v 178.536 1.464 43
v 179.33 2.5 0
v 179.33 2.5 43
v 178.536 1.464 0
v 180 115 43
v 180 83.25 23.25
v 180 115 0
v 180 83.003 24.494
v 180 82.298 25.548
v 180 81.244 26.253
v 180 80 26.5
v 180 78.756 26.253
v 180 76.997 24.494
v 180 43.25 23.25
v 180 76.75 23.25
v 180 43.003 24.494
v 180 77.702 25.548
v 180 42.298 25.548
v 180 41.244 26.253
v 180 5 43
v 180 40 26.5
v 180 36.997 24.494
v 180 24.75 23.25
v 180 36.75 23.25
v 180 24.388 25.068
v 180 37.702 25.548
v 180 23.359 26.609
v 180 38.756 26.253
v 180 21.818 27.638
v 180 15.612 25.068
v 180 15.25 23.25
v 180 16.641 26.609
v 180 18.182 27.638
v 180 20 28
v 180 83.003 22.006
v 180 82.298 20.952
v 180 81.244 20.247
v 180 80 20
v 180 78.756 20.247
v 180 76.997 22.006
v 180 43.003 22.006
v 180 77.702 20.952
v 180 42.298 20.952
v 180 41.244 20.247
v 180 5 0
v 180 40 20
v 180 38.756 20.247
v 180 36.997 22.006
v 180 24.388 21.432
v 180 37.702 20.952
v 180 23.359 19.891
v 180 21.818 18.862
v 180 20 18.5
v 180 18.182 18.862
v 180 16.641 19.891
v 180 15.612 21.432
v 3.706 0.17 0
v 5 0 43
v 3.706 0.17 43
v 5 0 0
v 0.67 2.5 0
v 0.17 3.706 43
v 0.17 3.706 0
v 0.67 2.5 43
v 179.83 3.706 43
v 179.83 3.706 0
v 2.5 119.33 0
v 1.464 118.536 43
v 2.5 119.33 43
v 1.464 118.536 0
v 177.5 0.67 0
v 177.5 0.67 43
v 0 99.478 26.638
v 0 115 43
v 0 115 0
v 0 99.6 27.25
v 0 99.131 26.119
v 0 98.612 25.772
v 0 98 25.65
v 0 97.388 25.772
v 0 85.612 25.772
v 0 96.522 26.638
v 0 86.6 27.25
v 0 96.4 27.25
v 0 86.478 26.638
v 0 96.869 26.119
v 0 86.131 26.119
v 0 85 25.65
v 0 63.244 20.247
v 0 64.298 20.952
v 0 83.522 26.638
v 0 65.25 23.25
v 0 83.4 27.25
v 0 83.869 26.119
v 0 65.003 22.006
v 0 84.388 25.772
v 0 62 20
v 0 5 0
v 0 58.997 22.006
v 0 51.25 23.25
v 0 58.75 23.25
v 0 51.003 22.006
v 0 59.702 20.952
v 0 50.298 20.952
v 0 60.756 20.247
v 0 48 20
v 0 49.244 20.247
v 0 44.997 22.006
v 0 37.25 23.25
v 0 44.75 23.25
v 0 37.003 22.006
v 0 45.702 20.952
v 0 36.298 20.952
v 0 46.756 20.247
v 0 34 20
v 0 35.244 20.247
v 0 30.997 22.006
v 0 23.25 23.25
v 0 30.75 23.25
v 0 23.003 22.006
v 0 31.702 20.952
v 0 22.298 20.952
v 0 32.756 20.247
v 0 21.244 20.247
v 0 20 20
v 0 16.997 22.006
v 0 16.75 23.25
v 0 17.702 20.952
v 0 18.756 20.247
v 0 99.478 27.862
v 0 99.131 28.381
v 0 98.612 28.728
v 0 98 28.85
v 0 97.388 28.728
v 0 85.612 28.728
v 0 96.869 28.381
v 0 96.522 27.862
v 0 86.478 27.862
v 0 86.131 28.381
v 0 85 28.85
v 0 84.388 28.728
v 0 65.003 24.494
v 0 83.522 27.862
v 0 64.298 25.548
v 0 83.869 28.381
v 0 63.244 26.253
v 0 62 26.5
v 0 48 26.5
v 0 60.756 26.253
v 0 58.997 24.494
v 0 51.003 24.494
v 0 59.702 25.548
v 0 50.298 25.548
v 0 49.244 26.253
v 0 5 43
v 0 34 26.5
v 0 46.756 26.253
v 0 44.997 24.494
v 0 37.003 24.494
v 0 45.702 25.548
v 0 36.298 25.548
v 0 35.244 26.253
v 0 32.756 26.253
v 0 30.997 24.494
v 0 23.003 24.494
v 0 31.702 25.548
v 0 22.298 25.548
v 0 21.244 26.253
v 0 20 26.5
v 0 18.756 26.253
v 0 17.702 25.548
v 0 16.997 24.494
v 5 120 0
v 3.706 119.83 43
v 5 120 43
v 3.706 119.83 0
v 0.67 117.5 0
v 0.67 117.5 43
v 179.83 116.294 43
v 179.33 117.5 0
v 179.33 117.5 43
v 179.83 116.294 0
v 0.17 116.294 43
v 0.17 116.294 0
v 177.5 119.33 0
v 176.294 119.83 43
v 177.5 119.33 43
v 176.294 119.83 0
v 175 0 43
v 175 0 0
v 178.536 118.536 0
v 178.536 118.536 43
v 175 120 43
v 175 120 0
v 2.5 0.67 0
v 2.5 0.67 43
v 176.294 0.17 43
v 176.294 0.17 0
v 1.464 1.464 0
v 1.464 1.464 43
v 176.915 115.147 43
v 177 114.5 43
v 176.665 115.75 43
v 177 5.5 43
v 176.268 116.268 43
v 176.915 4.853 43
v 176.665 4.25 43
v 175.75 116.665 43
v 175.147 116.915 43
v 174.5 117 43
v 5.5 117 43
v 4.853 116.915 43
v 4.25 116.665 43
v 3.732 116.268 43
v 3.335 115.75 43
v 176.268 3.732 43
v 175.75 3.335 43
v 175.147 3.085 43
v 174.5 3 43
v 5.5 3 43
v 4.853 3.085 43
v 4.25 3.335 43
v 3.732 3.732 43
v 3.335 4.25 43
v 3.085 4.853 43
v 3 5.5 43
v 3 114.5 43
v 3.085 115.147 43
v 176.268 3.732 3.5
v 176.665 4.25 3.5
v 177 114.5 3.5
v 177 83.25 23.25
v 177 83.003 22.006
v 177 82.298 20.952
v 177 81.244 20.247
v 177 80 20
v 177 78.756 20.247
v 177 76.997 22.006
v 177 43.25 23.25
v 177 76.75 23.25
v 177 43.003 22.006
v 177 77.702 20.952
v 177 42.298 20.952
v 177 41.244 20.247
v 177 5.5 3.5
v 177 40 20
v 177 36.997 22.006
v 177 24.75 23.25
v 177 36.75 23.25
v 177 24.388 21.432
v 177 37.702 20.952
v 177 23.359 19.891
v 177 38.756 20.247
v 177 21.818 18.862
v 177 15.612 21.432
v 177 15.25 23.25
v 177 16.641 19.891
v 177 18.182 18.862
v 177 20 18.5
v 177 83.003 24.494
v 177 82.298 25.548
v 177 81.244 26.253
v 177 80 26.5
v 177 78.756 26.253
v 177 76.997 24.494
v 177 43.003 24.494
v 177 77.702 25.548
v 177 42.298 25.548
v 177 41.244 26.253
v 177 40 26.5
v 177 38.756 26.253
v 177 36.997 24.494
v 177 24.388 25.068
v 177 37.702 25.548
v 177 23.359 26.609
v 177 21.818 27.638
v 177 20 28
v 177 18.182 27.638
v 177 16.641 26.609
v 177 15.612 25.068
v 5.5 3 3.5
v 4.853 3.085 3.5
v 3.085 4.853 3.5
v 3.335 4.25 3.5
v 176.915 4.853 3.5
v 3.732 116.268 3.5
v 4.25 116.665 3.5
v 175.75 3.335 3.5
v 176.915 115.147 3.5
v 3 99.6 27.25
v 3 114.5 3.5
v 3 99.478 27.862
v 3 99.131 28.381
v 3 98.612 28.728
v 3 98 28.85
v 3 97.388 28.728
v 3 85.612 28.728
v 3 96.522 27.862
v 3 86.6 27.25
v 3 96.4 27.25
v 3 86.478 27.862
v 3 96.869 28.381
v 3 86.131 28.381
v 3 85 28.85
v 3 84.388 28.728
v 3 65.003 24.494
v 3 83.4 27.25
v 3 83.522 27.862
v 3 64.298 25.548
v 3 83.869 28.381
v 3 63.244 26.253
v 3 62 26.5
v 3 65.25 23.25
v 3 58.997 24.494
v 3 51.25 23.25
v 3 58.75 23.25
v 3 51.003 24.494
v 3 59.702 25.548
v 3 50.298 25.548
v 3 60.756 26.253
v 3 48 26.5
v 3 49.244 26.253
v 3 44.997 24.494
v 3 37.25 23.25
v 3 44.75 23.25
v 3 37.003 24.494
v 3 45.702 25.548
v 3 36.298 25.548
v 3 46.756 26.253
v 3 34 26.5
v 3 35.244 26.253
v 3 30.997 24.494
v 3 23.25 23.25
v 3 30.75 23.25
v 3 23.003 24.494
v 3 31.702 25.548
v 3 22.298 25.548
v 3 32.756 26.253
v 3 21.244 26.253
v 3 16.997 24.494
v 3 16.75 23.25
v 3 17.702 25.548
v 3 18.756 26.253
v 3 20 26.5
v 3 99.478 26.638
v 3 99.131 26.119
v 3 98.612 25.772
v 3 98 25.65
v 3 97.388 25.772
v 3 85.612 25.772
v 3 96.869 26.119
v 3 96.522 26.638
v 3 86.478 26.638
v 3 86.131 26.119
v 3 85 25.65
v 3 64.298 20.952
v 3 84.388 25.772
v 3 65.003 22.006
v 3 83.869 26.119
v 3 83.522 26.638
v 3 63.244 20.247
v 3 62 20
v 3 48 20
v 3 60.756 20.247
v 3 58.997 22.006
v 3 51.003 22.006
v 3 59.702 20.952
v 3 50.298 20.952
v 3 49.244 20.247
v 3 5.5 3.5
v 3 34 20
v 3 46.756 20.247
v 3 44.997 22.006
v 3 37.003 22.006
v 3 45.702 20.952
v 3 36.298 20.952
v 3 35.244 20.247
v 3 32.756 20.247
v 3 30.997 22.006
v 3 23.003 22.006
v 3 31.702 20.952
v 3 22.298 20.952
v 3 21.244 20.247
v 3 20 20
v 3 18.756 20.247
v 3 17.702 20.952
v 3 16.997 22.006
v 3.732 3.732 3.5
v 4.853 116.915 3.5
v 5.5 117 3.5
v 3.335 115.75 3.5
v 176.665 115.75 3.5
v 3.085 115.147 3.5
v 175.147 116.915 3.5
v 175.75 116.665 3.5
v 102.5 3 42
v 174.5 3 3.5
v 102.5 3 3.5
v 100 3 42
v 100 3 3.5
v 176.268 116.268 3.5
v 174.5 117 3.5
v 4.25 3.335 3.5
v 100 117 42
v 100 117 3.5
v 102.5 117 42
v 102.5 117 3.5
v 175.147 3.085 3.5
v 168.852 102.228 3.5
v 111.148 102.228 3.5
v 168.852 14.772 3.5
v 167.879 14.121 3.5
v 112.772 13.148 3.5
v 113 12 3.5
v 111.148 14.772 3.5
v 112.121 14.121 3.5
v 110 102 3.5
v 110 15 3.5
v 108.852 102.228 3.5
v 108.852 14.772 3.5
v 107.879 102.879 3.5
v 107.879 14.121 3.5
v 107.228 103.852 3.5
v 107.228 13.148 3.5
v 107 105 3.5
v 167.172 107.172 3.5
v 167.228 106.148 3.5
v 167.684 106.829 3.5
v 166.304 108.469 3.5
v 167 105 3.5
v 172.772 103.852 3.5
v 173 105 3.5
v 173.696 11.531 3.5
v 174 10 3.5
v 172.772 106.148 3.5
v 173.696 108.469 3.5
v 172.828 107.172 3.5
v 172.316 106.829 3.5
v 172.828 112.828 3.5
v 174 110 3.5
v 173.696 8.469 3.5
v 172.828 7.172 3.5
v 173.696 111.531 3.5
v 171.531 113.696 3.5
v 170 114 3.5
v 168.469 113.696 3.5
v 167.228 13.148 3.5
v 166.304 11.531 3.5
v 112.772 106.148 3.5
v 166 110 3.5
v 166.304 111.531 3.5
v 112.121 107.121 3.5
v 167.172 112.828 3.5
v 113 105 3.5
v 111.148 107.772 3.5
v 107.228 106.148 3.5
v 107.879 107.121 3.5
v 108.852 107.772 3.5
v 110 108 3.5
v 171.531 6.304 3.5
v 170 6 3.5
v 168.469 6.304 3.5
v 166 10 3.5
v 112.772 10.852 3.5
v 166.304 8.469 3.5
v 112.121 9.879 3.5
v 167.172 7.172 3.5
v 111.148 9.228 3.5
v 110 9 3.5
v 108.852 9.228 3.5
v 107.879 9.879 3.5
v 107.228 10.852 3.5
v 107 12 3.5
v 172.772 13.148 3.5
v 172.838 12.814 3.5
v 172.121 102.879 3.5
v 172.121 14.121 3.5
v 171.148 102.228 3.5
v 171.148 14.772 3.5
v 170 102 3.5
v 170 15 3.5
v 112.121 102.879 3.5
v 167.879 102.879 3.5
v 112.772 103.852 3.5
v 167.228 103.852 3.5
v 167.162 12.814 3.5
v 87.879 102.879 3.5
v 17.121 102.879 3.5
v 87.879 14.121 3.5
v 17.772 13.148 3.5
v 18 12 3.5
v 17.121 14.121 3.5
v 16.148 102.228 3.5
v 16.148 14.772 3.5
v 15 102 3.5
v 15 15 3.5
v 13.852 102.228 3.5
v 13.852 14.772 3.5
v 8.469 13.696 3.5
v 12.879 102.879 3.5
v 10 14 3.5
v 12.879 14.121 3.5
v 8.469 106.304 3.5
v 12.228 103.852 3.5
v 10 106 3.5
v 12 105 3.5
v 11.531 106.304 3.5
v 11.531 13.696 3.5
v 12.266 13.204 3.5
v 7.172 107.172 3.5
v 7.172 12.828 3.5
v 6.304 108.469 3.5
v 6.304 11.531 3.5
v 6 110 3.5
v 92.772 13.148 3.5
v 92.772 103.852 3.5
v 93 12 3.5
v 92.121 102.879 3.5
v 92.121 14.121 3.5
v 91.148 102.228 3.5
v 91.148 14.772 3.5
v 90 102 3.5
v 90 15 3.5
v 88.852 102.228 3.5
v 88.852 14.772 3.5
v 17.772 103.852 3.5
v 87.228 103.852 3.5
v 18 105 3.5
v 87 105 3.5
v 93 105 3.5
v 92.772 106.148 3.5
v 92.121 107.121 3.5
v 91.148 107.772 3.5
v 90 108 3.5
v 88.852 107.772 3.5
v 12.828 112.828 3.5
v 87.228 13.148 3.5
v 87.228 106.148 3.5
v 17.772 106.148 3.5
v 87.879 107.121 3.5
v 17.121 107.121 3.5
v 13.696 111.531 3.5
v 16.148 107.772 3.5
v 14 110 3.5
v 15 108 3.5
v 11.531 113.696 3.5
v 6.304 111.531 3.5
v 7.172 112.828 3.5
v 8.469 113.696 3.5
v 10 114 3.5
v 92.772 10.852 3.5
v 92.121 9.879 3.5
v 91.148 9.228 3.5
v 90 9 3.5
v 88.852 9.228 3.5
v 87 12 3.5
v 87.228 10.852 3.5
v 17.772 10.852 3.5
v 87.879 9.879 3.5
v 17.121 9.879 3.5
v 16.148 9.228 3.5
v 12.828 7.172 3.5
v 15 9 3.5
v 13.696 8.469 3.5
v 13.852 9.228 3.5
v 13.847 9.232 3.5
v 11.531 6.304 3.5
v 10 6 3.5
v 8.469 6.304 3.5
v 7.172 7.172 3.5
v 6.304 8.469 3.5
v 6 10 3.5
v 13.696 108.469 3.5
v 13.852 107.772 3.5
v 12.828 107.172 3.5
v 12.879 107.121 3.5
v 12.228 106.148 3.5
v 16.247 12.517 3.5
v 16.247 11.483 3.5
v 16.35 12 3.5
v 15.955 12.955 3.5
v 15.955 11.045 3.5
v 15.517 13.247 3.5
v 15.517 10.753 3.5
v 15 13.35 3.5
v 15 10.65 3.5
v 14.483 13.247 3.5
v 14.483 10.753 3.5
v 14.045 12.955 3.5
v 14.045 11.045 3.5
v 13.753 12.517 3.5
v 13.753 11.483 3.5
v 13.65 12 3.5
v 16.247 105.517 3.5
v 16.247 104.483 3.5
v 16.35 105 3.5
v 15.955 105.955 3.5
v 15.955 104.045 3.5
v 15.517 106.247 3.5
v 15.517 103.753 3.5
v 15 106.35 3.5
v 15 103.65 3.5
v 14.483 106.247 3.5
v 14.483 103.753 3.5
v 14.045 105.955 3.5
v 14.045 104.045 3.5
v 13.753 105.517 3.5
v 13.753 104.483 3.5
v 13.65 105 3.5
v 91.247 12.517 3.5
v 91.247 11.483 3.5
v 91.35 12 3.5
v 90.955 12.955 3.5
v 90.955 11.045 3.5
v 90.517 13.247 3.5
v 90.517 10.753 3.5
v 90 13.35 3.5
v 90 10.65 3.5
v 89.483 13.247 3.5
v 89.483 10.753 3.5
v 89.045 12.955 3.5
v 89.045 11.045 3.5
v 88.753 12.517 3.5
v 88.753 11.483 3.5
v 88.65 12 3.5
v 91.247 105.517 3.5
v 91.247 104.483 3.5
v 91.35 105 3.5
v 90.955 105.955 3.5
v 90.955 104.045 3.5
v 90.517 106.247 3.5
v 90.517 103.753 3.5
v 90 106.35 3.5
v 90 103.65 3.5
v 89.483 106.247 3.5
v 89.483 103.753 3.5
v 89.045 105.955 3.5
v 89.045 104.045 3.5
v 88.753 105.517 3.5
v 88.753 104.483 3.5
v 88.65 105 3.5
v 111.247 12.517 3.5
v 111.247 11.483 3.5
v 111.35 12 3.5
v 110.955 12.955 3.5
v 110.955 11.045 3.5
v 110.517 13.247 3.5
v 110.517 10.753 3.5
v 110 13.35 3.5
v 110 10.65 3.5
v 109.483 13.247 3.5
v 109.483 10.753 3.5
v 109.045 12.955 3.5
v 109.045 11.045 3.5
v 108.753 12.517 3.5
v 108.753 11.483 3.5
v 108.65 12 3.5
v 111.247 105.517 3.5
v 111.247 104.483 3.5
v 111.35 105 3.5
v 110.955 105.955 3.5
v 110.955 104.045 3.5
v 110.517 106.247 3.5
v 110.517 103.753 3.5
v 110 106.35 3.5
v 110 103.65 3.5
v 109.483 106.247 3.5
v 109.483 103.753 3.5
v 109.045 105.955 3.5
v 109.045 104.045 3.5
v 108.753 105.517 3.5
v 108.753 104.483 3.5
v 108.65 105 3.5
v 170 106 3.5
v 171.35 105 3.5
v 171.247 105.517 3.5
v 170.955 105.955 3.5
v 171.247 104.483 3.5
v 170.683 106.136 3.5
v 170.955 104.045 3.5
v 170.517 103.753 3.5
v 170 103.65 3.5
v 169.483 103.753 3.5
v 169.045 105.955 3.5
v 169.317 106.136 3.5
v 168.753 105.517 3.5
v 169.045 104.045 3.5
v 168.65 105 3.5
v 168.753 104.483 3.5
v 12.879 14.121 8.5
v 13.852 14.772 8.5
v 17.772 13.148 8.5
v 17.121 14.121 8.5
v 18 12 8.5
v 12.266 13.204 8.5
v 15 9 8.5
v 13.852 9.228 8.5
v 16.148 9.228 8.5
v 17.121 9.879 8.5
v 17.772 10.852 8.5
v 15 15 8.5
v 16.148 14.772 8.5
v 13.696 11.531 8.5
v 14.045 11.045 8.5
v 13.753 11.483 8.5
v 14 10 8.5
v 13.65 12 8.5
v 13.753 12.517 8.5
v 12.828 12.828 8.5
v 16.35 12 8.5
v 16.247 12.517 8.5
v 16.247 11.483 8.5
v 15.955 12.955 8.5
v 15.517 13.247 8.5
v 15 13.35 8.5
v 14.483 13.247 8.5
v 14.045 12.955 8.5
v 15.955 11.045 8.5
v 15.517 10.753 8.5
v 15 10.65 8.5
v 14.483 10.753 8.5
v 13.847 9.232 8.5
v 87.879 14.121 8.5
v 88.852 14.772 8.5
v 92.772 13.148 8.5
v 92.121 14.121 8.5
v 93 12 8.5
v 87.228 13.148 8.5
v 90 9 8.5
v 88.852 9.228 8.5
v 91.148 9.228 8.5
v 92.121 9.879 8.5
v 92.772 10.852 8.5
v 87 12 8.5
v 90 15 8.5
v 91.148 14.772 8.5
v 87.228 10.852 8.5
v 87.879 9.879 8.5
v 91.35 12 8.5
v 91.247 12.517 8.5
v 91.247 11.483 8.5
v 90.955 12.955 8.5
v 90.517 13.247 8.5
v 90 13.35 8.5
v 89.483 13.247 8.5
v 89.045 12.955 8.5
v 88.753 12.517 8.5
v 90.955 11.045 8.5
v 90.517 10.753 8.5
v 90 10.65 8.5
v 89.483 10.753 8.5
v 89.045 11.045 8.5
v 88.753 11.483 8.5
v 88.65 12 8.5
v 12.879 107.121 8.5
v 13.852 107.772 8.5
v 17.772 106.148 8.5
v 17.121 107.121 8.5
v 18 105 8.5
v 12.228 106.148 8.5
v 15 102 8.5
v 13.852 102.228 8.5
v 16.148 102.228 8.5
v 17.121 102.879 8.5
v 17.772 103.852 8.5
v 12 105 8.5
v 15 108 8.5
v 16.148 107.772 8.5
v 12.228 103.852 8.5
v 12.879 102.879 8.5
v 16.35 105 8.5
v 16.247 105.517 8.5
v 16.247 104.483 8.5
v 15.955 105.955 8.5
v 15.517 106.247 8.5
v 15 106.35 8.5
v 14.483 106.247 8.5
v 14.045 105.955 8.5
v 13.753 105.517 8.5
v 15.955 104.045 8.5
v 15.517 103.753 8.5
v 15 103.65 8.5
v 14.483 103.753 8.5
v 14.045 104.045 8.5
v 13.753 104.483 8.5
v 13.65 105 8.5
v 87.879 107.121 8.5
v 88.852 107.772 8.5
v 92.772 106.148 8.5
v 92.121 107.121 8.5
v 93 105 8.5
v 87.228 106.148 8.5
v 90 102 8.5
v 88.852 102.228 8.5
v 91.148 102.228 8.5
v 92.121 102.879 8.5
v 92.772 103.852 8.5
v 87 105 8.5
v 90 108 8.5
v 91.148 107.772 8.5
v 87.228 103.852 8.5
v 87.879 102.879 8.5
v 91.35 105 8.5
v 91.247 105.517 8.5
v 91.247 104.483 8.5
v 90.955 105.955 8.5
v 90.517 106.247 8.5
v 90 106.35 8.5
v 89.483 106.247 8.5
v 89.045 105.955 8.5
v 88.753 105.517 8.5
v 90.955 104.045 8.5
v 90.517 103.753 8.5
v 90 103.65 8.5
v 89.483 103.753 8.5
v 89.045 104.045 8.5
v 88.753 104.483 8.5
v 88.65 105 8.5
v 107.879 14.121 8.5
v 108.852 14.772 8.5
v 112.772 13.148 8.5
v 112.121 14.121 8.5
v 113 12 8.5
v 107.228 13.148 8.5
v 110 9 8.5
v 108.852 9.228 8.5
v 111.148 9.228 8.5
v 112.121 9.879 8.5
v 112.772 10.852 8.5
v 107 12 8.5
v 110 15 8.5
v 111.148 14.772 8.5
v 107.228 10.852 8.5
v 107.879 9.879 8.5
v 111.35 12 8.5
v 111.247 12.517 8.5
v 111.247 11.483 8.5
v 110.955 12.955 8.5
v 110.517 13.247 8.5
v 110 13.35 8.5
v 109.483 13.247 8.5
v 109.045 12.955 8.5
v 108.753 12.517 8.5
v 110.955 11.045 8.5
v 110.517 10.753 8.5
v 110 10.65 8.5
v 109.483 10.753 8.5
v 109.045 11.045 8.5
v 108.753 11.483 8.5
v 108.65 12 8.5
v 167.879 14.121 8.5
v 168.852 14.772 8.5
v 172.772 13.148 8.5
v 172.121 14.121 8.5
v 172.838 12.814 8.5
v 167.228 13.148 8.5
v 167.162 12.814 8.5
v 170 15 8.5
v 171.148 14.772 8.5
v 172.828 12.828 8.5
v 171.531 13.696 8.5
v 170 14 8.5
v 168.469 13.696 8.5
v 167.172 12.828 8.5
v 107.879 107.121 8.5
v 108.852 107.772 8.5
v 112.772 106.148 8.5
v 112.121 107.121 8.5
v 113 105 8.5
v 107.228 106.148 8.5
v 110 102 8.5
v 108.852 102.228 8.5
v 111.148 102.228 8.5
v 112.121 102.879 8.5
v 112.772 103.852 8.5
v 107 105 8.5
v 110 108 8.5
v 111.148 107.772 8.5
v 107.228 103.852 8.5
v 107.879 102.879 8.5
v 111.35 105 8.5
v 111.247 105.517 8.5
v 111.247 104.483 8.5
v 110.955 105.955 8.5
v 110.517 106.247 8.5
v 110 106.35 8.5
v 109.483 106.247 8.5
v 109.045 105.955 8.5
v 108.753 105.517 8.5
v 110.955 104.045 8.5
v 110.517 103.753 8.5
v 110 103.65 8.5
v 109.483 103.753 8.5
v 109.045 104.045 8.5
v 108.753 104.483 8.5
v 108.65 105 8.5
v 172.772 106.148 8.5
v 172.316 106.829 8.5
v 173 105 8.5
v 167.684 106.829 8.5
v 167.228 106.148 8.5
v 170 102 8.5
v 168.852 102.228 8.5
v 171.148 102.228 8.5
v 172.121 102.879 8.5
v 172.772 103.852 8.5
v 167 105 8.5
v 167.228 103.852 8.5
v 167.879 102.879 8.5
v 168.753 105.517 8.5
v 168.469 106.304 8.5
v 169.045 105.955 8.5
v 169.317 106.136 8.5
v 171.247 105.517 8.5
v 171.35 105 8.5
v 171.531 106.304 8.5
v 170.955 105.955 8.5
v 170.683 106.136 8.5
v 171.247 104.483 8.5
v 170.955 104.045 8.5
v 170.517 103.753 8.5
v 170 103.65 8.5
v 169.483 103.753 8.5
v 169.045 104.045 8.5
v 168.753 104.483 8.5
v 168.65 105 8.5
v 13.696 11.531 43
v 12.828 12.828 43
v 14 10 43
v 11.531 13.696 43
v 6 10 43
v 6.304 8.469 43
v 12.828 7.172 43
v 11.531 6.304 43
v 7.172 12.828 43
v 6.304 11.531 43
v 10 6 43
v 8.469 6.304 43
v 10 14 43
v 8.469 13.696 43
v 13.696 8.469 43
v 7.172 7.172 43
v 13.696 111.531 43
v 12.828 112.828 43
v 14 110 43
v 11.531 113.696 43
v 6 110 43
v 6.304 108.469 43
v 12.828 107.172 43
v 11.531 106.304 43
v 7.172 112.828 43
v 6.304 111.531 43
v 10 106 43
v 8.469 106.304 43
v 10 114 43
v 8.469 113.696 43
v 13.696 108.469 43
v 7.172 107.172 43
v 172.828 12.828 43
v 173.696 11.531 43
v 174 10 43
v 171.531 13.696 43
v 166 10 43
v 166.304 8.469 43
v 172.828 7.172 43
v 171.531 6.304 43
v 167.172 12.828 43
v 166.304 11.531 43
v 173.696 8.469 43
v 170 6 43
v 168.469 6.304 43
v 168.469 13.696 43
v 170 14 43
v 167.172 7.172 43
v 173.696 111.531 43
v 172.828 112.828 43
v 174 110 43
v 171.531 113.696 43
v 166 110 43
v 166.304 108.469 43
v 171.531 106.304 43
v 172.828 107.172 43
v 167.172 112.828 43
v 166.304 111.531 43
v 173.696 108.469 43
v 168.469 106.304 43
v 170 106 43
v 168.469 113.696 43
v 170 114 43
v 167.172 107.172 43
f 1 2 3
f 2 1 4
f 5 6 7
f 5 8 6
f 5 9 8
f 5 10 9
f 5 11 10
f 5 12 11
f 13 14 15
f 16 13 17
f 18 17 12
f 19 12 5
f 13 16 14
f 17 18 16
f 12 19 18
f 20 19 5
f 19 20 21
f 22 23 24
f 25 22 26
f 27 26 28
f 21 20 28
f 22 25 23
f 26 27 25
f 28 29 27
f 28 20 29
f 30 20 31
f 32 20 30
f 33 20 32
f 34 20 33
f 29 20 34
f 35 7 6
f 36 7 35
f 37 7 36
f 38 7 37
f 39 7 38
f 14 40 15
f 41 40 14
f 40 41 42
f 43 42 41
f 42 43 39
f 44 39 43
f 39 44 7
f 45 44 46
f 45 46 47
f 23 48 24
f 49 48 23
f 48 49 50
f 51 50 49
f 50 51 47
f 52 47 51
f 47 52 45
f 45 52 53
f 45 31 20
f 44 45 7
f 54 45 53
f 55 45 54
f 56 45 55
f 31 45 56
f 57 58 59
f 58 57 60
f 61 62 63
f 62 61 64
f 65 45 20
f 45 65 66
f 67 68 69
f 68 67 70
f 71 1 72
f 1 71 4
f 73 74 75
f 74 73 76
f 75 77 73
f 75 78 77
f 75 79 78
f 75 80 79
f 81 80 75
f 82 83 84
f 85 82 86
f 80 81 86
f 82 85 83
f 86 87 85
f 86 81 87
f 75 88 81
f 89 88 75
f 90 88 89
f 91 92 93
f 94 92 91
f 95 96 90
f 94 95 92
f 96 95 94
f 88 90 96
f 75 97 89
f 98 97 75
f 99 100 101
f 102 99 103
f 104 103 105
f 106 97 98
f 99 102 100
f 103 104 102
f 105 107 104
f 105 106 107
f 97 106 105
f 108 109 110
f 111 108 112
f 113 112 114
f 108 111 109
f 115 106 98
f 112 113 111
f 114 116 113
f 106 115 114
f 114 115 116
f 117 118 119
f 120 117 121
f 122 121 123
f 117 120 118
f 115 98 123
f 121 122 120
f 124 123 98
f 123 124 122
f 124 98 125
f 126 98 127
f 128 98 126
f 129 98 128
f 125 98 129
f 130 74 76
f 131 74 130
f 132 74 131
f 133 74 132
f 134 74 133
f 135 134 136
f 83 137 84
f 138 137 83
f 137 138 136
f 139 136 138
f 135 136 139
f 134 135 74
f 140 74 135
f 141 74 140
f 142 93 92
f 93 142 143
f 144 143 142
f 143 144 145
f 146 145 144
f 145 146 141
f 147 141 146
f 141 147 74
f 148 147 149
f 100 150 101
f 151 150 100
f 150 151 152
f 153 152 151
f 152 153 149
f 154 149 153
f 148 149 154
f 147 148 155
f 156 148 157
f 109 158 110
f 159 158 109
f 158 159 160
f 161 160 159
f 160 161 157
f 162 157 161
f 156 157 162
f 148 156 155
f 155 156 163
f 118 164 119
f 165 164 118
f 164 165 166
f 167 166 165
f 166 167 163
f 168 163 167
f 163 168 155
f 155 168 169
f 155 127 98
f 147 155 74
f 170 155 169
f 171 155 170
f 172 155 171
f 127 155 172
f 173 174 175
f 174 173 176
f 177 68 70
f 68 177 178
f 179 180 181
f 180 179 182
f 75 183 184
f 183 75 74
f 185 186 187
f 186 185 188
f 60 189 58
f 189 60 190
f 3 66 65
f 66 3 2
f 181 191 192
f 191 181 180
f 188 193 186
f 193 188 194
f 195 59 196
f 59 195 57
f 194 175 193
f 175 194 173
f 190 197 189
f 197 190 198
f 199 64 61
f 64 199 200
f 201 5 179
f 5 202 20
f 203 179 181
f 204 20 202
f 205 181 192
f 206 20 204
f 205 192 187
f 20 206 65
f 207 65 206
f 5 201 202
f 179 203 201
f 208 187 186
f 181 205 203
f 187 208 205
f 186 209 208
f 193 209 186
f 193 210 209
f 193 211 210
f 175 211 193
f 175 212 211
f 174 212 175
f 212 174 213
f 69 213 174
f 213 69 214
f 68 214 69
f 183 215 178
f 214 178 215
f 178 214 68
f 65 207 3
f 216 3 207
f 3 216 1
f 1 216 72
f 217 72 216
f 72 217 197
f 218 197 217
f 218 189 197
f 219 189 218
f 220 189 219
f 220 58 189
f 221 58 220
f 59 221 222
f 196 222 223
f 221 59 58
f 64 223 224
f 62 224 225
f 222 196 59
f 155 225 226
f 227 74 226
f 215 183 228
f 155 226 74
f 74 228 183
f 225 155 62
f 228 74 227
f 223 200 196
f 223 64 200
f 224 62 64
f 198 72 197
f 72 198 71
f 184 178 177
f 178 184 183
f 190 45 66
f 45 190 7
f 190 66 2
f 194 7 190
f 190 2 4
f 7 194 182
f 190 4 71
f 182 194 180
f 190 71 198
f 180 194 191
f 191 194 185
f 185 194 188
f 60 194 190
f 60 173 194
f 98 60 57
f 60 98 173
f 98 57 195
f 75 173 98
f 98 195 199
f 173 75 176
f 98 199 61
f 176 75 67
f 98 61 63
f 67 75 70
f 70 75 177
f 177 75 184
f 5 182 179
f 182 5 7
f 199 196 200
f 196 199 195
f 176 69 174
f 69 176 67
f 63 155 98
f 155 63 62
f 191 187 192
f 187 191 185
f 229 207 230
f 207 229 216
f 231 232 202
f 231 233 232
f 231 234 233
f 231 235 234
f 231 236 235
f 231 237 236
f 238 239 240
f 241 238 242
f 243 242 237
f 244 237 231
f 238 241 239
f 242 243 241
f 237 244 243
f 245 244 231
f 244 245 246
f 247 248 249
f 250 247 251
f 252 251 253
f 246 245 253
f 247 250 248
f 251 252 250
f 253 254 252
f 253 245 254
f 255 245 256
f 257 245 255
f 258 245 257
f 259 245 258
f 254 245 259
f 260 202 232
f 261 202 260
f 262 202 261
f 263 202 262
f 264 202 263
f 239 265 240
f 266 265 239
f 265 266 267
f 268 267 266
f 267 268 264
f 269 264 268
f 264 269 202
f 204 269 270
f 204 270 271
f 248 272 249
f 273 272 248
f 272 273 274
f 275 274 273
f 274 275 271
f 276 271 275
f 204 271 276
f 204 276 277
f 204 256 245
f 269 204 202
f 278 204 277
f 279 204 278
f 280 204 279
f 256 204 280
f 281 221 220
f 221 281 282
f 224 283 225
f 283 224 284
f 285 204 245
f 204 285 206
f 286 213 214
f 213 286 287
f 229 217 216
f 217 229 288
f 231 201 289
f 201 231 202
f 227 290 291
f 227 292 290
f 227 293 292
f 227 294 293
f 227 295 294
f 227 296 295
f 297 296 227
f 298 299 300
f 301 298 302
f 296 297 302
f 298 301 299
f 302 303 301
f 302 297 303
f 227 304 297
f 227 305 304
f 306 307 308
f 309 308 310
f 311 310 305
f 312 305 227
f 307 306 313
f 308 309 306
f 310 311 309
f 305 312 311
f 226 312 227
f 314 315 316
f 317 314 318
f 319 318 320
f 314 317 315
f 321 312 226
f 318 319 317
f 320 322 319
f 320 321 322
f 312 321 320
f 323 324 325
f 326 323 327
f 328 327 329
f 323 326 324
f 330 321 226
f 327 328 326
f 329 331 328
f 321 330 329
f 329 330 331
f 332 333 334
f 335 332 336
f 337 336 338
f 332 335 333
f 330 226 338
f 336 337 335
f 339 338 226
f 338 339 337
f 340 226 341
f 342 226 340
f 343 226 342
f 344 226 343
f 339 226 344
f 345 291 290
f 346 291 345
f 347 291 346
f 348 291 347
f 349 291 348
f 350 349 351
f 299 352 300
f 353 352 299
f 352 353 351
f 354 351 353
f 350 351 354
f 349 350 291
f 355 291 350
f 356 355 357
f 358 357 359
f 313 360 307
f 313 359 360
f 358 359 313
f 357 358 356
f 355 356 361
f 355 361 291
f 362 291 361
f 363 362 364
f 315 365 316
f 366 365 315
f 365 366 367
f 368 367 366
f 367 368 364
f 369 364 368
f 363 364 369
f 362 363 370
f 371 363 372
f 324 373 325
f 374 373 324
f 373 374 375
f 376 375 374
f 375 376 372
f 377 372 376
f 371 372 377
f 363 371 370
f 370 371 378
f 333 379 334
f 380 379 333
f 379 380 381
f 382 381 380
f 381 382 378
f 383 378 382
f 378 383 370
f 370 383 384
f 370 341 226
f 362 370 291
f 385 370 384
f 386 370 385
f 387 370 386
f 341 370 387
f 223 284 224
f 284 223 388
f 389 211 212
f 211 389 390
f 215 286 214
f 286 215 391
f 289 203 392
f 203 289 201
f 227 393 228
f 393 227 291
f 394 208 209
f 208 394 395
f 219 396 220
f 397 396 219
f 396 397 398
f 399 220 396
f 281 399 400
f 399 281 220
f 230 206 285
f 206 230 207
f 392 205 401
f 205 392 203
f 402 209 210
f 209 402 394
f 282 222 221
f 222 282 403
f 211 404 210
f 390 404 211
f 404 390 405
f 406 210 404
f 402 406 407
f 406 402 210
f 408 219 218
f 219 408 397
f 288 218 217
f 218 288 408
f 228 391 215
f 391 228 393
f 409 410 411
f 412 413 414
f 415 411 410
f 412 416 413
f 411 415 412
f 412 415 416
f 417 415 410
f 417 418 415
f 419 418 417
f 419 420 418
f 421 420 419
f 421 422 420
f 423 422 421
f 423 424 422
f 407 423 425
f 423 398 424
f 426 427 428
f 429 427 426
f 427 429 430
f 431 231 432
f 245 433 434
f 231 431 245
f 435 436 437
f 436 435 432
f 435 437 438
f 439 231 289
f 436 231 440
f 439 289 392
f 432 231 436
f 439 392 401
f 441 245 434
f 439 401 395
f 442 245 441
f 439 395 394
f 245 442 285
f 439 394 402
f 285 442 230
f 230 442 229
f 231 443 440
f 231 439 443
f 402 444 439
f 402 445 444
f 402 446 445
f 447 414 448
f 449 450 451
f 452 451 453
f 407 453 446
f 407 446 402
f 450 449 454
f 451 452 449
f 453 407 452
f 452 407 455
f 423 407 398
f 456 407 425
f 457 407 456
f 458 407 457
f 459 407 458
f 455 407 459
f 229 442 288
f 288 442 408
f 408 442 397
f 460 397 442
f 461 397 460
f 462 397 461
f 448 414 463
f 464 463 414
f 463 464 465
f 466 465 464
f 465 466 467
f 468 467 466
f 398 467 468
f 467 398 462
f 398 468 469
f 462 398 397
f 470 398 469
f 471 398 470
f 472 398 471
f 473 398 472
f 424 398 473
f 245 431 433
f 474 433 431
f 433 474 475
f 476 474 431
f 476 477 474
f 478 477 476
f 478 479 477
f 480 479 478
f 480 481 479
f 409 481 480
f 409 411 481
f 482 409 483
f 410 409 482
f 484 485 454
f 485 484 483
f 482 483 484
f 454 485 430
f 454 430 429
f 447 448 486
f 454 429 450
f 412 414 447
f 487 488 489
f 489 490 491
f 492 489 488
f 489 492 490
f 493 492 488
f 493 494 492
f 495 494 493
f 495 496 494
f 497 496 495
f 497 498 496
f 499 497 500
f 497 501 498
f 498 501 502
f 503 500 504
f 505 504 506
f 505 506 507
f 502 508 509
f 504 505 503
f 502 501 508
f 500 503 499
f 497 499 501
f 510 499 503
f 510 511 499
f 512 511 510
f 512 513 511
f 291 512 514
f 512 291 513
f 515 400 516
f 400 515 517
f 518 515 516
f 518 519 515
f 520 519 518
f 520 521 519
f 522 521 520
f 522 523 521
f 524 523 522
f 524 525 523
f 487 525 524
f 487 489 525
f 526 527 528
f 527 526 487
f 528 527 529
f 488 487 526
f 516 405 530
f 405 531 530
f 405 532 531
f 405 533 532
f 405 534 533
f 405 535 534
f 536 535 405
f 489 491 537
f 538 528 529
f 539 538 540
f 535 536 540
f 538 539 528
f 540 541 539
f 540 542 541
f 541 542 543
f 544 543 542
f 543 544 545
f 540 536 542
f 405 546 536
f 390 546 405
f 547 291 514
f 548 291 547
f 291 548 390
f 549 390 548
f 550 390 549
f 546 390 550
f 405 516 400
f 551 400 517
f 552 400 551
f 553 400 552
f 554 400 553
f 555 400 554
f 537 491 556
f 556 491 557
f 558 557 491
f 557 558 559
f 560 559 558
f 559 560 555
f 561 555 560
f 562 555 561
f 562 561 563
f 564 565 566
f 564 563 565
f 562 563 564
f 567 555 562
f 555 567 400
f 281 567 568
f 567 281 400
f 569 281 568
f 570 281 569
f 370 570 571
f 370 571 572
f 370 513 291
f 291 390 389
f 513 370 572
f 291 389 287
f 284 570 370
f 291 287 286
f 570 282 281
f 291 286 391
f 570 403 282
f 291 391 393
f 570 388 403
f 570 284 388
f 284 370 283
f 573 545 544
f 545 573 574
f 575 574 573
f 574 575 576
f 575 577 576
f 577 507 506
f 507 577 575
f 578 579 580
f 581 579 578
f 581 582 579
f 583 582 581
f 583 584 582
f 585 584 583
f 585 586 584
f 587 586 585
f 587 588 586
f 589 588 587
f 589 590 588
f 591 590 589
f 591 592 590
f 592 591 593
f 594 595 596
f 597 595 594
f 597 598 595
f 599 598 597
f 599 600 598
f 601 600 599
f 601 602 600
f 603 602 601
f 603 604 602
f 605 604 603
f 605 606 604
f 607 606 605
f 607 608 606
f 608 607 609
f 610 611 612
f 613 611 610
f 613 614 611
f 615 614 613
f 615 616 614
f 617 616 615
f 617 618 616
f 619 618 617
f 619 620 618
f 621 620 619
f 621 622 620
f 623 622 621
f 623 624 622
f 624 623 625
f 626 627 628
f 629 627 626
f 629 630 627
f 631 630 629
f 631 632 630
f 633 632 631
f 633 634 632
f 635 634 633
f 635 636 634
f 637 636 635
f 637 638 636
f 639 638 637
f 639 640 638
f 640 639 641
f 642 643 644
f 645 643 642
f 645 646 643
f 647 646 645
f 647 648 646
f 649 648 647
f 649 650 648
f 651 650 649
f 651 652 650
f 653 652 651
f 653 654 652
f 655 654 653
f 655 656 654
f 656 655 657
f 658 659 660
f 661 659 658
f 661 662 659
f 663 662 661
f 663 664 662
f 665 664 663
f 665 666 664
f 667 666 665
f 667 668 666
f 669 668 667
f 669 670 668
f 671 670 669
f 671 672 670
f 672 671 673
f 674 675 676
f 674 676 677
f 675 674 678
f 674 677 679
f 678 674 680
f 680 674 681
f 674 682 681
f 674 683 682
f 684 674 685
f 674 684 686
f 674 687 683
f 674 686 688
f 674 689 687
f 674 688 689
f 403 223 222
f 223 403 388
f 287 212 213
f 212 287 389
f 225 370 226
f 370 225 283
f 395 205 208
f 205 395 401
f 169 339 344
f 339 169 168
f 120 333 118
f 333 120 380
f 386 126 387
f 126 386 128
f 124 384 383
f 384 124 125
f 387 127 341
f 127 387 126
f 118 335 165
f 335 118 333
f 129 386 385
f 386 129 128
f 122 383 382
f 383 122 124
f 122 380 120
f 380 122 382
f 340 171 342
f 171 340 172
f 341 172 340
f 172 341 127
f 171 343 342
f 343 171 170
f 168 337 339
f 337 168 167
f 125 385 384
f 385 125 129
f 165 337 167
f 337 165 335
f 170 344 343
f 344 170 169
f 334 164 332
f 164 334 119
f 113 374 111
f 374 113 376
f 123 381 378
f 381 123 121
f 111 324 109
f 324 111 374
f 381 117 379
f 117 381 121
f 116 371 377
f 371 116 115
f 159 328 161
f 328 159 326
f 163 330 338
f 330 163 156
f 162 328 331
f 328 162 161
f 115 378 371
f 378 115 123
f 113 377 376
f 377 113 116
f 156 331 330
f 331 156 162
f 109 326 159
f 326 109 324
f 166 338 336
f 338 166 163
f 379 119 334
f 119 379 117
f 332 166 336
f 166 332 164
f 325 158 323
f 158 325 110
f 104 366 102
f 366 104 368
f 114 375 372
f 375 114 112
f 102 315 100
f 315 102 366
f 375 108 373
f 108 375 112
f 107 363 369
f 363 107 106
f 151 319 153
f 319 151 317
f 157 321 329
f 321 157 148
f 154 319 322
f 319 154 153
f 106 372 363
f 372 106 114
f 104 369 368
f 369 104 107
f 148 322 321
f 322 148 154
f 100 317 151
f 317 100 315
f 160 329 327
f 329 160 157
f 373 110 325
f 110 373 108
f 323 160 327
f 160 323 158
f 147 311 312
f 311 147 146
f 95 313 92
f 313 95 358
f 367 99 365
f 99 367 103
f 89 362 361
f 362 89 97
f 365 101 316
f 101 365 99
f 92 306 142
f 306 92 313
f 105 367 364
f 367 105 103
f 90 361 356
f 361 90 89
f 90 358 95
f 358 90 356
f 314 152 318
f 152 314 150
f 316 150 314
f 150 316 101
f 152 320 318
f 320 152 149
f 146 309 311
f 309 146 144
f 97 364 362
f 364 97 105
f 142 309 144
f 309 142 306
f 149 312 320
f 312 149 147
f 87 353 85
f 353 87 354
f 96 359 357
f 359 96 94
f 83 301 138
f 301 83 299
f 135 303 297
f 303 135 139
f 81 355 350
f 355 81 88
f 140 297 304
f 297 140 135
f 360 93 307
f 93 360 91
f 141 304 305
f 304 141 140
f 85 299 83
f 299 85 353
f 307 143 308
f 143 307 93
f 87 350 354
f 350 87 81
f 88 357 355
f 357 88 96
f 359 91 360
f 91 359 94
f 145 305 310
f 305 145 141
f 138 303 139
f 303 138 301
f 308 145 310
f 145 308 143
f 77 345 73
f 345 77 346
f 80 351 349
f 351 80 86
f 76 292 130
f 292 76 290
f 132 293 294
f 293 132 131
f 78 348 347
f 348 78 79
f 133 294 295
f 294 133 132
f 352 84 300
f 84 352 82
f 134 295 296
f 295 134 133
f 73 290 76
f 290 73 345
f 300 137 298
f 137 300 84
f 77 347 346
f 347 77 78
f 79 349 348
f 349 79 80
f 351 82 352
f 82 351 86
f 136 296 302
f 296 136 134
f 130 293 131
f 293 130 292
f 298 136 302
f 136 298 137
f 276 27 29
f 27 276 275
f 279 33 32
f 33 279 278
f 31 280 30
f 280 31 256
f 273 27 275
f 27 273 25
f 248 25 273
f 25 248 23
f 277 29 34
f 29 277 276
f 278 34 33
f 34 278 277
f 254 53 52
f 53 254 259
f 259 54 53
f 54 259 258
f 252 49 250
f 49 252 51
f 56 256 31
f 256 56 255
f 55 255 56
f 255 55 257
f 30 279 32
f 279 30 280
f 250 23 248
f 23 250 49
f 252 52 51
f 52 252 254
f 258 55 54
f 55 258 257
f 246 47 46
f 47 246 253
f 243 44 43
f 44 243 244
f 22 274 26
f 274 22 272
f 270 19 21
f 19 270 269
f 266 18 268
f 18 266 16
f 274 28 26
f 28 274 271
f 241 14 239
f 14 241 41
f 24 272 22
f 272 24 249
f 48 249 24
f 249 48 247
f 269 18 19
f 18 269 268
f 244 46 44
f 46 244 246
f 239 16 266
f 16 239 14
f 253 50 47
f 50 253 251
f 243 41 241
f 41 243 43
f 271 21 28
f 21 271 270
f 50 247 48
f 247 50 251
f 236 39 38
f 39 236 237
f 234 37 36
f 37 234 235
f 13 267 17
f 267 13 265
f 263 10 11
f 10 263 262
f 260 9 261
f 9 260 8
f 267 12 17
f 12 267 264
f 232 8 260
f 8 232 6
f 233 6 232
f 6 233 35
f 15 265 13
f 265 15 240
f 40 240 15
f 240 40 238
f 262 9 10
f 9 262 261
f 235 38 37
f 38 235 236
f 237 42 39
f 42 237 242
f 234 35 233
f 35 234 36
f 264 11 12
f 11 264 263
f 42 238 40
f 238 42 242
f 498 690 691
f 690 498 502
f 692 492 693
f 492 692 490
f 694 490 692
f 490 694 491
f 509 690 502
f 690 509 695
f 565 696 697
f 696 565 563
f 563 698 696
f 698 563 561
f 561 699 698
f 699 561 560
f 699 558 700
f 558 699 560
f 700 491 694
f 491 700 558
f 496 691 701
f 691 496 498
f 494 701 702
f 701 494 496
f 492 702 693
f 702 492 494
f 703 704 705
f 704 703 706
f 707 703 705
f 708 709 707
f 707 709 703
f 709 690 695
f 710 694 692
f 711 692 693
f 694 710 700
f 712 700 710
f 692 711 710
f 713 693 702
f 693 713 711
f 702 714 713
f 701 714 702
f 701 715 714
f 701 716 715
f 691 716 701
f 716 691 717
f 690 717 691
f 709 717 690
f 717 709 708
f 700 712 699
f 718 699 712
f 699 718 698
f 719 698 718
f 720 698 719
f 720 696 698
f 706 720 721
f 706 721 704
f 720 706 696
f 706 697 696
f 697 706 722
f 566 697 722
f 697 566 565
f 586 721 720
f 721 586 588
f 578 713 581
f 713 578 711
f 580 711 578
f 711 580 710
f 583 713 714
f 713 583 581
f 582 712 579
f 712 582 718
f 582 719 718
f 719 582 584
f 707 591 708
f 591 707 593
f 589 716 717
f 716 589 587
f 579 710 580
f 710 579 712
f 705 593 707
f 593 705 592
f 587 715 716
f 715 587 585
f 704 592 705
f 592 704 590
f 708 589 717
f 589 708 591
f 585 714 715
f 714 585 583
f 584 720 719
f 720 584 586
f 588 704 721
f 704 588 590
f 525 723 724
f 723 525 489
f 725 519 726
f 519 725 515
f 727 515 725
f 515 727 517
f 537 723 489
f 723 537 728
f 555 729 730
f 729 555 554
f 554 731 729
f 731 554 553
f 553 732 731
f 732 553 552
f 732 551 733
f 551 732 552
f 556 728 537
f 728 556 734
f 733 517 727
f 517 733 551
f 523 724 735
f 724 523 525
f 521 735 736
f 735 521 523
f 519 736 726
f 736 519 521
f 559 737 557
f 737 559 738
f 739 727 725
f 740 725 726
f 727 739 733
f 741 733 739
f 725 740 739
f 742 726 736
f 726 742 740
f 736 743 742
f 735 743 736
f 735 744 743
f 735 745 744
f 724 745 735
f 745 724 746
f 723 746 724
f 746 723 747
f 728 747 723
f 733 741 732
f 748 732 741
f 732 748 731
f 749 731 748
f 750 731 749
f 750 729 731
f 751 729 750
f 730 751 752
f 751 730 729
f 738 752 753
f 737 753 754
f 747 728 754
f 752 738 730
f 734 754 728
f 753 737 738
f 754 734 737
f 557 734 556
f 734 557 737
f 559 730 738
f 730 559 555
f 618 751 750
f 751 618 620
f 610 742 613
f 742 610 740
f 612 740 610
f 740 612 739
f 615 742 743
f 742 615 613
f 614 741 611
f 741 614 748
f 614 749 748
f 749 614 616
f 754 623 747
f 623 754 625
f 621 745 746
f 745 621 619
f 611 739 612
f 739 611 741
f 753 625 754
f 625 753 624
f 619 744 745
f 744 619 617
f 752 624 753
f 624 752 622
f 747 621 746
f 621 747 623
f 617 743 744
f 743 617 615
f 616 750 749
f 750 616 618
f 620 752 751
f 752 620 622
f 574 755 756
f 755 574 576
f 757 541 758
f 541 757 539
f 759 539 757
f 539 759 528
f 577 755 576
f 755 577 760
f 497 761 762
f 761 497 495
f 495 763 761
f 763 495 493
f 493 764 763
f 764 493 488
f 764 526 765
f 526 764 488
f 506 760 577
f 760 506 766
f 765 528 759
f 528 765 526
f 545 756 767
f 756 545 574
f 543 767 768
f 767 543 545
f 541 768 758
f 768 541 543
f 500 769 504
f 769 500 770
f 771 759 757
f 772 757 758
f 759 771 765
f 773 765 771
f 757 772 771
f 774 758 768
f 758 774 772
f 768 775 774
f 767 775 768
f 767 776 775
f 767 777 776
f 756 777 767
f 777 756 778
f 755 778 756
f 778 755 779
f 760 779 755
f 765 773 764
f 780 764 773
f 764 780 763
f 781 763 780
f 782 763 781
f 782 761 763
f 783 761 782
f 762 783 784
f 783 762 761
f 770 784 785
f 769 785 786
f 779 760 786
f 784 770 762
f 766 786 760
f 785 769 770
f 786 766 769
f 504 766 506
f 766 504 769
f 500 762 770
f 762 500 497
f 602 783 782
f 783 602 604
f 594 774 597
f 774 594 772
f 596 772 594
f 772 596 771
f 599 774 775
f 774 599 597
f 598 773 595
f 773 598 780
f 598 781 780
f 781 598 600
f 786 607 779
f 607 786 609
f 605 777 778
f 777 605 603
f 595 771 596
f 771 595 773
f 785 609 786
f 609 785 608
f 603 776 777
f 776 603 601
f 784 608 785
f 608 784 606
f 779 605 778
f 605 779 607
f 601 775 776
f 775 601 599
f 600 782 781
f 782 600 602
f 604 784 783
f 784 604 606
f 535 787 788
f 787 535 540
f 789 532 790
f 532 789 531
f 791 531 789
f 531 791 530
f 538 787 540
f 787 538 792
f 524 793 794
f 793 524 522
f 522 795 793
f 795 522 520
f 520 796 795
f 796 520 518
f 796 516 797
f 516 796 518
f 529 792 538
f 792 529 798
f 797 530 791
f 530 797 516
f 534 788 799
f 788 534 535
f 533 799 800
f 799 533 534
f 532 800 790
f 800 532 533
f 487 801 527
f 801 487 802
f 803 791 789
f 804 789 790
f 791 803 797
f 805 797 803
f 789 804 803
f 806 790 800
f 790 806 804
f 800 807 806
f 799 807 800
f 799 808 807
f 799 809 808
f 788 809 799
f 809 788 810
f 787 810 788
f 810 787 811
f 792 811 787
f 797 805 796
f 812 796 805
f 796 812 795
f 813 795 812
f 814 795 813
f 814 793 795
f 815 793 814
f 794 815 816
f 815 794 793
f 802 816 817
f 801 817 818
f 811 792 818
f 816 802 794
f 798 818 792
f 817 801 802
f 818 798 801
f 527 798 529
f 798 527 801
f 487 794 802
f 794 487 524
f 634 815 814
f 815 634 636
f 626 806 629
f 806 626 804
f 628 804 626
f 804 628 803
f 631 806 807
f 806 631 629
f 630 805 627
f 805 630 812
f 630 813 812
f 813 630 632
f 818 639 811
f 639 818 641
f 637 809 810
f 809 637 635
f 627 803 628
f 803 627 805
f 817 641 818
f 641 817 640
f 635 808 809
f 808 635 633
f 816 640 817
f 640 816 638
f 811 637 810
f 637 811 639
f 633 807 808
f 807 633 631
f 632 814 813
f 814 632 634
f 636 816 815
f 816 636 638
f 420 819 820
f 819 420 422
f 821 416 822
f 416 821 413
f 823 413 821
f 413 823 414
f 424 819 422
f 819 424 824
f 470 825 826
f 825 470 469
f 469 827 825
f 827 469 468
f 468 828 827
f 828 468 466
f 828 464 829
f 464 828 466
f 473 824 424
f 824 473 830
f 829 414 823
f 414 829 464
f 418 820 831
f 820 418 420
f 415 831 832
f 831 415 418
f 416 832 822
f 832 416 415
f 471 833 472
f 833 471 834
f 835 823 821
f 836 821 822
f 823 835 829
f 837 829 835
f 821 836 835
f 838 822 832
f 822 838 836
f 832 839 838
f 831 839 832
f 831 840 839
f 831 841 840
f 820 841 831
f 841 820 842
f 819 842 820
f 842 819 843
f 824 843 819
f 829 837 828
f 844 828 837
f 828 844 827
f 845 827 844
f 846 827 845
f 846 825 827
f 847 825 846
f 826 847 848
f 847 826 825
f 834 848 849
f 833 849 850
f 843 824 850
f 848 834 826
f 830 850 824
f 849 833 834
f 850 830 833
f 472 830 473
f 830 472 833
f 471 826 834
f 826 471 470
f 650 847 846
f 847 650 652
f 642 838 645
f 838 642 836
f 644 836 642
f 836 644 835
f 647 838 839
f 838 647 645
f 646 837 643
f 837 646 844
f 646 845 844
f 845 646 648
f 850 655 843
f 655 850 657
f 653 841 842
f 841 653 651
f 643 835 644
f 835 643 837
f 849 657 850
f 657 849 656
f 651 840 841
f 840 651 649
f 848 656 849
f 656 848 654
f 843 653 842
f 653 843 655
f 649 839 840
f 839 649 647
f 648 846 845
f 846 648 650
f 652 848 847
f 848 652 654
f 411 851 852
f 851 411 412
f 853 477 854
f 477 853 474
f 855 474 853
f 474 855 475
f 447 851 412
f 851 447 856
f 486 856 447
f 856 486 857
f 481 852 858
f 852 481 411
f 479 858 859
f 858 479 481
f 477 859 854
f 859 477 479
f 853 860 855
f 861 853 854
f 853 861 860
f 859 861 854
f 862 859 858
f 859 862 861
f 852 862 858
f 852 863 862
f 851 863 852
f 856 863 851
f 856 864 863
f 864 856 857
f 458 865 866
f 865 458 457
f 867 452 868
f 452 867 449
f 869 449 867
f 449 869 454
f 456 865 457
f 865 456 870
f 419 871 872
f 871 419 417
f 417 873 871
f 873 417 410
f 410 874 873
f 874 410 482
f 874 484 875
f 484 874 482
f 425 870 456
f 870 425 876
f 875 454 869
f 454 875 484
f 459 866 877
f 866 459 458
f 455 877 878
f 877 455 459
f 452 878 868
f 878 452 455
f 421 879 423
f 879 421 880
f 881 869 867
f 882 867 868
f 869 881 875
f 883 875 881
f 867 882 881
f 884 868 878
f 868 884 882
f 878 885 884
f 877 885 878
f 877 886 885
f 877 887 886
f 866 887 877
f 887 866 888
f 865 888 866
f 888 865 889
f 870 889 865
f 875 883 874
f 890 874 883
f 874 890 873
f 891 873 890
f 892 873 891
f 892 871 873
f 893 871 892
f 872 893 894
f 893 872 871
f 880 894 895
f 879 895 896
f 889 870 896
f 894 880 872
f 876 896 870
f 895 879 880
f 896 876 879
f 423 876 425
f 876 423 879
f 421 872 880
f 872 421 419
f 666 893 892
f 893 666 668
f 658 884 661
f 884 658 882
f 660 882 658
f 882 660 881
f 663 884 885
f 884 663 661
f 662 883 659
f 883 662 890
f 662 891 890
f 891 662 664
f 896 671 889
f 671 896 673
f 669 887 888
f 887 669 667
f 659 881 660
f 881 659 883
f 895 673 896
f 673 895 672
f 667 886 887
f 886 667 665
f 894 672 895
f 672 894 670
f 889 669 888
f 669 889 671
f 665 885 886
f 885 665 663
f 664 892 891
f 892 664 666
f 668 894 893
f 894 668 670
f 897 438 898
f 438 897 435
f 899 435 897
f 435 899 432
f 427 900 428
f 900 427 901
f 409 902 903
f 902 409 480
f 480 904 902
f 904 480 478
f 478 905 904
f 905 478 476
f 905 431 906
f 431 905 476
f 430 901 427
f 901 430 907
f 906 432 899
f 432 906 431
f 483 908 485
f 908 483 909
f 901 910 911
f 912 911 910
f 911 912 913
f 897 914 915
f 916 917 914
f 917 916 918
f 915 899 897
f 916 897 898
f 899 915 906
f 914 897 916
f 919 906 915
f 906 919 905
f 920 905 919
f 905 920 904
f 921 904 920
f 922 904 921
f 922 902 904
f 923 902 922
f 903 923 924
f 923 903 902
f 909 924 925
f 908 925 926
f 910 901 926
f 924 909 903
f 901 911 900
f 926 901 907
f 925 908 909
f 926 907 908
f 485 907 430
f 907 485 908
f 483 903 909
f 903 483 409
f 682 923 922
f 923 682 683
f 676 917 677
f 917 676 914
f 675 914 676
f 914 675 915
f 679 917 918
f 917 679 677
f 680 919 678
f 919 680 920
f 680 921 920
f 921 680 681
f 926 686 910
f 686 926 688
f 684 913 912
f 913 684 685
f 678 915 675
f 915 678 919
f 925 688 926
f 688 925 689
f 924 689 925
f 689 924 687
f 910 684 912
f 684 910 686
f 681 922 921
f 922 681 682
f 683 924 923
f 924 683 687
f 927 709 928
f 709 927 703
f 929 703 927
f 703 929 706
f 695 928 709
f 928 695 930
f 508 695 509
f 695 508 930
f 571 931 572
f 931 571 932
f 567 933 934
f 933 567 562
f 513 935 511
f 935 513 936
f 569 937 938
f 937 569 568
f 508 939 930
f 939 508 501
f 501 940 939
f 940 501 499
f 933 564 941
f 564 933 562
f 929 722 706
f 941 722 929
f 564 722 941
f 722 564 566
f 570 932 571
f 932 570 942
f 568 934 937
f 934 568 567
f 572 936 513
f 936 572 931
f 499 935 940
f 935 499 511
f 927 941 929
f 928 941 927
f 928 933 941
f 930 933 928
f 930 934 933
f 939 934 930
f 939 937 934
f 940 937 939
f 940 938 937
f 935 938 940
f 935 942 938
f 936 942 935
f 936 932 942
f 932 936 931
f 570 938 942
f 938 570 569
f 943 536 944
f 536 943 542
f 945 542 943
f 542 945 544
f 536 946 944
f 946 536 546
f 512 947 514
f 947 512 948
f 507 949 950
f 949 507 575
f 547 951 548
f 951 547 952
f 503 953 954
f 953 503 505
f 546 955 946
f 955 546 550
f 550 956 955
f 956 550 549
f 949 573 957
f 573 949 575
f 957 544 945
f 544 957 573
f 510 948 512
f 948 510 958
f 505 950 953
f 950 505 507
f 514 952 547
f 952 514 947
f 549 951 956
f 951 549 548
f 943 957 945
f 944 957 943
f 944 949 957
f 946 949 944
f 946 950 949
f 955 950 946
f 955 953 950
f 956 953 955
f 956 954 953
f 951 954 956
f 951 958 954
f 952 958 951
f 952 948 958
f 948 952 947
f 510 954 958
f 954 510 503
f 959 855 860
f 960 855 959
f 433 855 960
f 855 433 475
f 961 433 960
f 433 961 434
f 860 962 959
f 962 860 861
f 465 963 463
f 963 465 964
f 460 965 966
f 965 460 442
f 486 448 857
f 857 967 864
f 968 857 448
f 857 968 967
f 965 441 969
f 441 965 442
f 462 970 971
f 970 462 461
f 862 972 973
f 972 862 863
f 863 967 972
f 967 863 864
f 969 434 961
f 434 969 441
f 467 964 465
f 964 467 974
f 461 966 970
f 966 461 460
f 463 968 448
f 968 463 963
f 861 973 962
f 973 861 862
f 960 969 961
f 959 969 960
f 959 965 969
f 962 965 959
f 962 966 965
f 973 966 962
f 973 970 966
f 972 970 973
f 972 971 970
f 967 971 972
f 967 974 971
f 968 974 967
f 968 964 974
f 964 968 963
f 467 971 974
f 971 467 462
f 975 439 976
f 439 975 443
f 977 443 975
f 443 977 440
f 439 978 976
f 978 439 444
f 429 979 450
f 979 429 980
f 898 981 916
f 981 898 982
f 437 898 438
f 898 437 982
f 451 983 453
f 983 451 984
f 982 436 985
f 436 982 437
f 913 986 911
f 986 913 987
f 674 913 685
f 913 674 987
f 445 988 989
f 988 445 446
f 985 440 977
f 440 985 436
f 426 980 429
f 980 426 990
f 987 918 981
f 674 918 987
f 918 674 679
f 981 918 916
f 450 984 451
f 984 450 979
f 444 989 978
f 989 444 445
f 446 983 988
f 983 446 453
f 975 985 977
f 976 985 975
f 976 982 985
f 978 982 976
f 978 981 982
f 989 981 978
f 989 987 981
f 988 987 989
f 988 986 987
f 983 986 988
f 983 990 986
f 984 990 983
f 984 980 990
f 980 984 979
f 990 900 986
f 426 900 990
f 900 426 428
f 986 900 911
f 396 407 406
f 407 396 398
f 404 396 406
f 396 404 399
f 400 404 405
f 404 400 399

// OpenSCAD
/**
 * cal_station_box.scad — TM-CAL-ENC-002 Rev A
 * Calibration Station Combined Enclosure
 *
 * Larger integration box for full bench/field cal station:
 *   - GPSDO PCB with ESP32 + Si5351 + GPS
 *   - Power reference PCB (AD8307 + attenuator chain)
 *   - CYD touchscreen display (optional, front panel cutout)
 *   - Internal RF dividers to isolate signal paths
 *
 * This enclosure is for bench/station use.
 * The gpsdo_enclosure.scad (smaller) is for pure portable use.
 *
 * Envelope: 180×120×55 mm
 */

// ── Parameters ──────────────────────────────────────────────────────────────
box_w  = 180.0;
box_d  = 120.0;
box_h  = 55.0;
wall   = 3.0;
floor_h = 3.5;
lid_h  = 12.0;
body_h = box_h - lid_h;
r      = 5.0;
$fn    = 32;

sma_d     = 6.5;
bnc_d     = 9.5;
led_d     = 3.2;
usb_w     = 9.0;
usb_h     = 4.0;
barrel_d  = 6.5;
screw_d   = 3.3;

// CYD touchscreen window (2.8" TFT: 75mm × 58mm active area)
cyd_w     = 78.0;
cyd_h     = 62.0;

// Internal RF divider wall (vertical partition between signal ref and counter)
div_x     = 100.0;

module rounded_box(w, d, h, r_) {
    hull()
        for (x=[r_, w-r_]) for (y=[r_, d-r_])
            translate([x, y, 0]) cylinder(h=h, r=r_, $fn=24);
}

module standoff(x, y, h_=5.0) {
    translate([x, y, floor_h])
        difference() {
            cylinder(h=h_, d=6.0, $fn=16);
            translate([0,0,-0.5]) cylinder(h=h_+1, d=2.7, $fn=16);
        }
}

module body() {
    difference() {
        rounded_box(box_w, box_d, body_h, r);

        // Inner cavity
        translate([wall, wall, floor_h])
            rounded_box(box_w-2*wall, box_d-2*wall, body_h, r-wall+0.5);

        // ── FRONT PANEL (y=box_d) ─────────────────────────────────────
        // CYD display window (if CYD mounted in front panel)
        translate([(box_w-cyd_w)/2, box_d+0.5, floor_h+2])
            cube([cyd_w, wall+1, cyd_h]);

        // ── LEFT PANEL (x=0): SMA outputs ─────────────────────────────
        // SMA: 10M REF
        translate([-0.5, 20, floor_h + (body_h-floor_h)/2])
        rotate([0,90,0]) cylinder(h=wall+1, d=sma_d, $fn=16);
        // SMA: 1M REF
        translate([-0.5, 34, floor_h + (body_h-floor_h)/2])
        rotate([0,90,0]) cylinder(h=wall+1, d=sma_d, $fn=16);
        // SMA: PROG OUT
        translate([-0.5, 48, floor_h + (body_h-floor_h)/2])
        rotate([0,90,0]) cylinder(h=wall+1, d=sma_d, $fn=16);
        // SMA: CAL LVL (−20 dBm)
        translate([-0.5, 62, floor_h + (body_h-floor_h)/2])
        rotate([0,90,0]) cylinder(h=wall+1, d=sma_d, $fn=16);
        // LEDs
        translate([-0.5, 85, floor_h + (body_h-floor_h)/2 + 4])
        rotate([0,90,0]) cylinder(h=wall+1, d=led_d, $fn=16);  // GPS
        translate([-0.5, 98, floor_h + (body_h-floor_h)/2 + 4])
        rotate([0,90,0]) cylinder(h=wall+1, d=led_d, $fn=16);  // LOCK

        // ── RIGHT PANEL (x=box_w): FREQ IN, GPS ANT, power ────────────
        // BNC: FREQ IN
        translate([box_w+0.5, 20, floor_h + (body_h-floor_h)/2])
        rotate([0,-90,0]) cylinder(h=wall+1, d=bnc_d, $fn=16);
        // SMA: GPS ANT
        translate([box_w+0.5, 40, floor_h + (body_h-floor_h)/2])
        rotate([0,-90,0]) cylinder(h=wall+1, d=sma_d, $fn=16);
        // USB Micro-B
        translate([box_w+0.5, 60-usb_w/2, floor_h + 5])
            cube([wall+1, usb_w, usb_h]);
        // Barrel jack 5V
        translate([box_w+0.5, 80, floor_h + (body_h-floor_h)/2])
        rotate([0,-90,0]) cylinder(h=wall+1, d=barrel_d, $fn=16);

        // ── Lid screw holes ─────────────────────────────────────────────
        for (x=[10, box_w-10]) for (y=[10, box_d-10])
            translate([x, y, body_h-5])
                cylinder(h=6, d=screw_d, $fn=16);
    }

    // Internal RF divider wall (separates signal ref from counter section)
    translate([div_x, wall, floor_h])
        cube([2.5, box_d-2*wall, body_h - floor_h - 1]);

    // PCB standoffs — left section (GPSDO PCB ~80×90mm)
    for (pos=[[15, 12], [90, 12], [15, 105], [90, 105]])
        standoff(pos[0], pos[1]);

    // PCB standoffs — right section (power ref PCB ~60×90mm)
    for (pos=[[110, 12], [170, 12], [110, 105], [170, 105]])
        standoff(pos[0], pos[1]);

    // Corner screw bosses
    for (x=[10, box_w-10]) for (y=[10, box_d-10])
        translate([x, y, 0]) cylinder(h=body_h, d=8, $fn=16);
}

module lid() {
    fl_d    = 4.0;
    plate_h = lid_h - fl_d;
    difference() {
        union() {
            rounded_box(box_w, box_d, plate_h, r);
            translate([wall+1, wall+1, plate_h])
                rounded_box(box_w-2*(wall+1), box_d-2*(wall+1), fl_d, r-wall);
        }
        for (x=[10, box_w-10]) for (y=[10, box_d-10])
            translate([x, y, -0.5])
                cylinder(h=lid_h+1, d=screw_d, $fn=16);
        // Vent slots (RF-safe: ≤10mm length for f < 15 GHz)
        for (sx=[20:15:160])
            translate([sx, 40, -0.5])
                cube([8, 2, plate_h+1]);
    }
}

print_part = "body";   // "body" | "lid"

if (print_part == "body")
    color("steelblue", 0.9) body();
else
    color("lightsteelblue", 0.9) lid();

// ── Assembly Notes ──────────────────────────────────────────────────────────
// 1. Print body and lid in PETG (temperature-stable, adequate RF shielding base).
// 2. Line interior walls, floor, lid inner face with copper adhesive tape.
// 3. Mount GPSDO PCB in left section (x=0 to 100); power ref PCB in right section.
// 4. Connect RF divider wall to copper tape ground plane with copper tape.
// 5. If using CYD: mount CYD in front panel opening; secure with M2 screws.
//    Run ribbon cable from CYD to ESP32 GPIO through internal grommet.
// 6. GPS patch antenna mounts outside on top of enclosure or remote via SMA coax.
